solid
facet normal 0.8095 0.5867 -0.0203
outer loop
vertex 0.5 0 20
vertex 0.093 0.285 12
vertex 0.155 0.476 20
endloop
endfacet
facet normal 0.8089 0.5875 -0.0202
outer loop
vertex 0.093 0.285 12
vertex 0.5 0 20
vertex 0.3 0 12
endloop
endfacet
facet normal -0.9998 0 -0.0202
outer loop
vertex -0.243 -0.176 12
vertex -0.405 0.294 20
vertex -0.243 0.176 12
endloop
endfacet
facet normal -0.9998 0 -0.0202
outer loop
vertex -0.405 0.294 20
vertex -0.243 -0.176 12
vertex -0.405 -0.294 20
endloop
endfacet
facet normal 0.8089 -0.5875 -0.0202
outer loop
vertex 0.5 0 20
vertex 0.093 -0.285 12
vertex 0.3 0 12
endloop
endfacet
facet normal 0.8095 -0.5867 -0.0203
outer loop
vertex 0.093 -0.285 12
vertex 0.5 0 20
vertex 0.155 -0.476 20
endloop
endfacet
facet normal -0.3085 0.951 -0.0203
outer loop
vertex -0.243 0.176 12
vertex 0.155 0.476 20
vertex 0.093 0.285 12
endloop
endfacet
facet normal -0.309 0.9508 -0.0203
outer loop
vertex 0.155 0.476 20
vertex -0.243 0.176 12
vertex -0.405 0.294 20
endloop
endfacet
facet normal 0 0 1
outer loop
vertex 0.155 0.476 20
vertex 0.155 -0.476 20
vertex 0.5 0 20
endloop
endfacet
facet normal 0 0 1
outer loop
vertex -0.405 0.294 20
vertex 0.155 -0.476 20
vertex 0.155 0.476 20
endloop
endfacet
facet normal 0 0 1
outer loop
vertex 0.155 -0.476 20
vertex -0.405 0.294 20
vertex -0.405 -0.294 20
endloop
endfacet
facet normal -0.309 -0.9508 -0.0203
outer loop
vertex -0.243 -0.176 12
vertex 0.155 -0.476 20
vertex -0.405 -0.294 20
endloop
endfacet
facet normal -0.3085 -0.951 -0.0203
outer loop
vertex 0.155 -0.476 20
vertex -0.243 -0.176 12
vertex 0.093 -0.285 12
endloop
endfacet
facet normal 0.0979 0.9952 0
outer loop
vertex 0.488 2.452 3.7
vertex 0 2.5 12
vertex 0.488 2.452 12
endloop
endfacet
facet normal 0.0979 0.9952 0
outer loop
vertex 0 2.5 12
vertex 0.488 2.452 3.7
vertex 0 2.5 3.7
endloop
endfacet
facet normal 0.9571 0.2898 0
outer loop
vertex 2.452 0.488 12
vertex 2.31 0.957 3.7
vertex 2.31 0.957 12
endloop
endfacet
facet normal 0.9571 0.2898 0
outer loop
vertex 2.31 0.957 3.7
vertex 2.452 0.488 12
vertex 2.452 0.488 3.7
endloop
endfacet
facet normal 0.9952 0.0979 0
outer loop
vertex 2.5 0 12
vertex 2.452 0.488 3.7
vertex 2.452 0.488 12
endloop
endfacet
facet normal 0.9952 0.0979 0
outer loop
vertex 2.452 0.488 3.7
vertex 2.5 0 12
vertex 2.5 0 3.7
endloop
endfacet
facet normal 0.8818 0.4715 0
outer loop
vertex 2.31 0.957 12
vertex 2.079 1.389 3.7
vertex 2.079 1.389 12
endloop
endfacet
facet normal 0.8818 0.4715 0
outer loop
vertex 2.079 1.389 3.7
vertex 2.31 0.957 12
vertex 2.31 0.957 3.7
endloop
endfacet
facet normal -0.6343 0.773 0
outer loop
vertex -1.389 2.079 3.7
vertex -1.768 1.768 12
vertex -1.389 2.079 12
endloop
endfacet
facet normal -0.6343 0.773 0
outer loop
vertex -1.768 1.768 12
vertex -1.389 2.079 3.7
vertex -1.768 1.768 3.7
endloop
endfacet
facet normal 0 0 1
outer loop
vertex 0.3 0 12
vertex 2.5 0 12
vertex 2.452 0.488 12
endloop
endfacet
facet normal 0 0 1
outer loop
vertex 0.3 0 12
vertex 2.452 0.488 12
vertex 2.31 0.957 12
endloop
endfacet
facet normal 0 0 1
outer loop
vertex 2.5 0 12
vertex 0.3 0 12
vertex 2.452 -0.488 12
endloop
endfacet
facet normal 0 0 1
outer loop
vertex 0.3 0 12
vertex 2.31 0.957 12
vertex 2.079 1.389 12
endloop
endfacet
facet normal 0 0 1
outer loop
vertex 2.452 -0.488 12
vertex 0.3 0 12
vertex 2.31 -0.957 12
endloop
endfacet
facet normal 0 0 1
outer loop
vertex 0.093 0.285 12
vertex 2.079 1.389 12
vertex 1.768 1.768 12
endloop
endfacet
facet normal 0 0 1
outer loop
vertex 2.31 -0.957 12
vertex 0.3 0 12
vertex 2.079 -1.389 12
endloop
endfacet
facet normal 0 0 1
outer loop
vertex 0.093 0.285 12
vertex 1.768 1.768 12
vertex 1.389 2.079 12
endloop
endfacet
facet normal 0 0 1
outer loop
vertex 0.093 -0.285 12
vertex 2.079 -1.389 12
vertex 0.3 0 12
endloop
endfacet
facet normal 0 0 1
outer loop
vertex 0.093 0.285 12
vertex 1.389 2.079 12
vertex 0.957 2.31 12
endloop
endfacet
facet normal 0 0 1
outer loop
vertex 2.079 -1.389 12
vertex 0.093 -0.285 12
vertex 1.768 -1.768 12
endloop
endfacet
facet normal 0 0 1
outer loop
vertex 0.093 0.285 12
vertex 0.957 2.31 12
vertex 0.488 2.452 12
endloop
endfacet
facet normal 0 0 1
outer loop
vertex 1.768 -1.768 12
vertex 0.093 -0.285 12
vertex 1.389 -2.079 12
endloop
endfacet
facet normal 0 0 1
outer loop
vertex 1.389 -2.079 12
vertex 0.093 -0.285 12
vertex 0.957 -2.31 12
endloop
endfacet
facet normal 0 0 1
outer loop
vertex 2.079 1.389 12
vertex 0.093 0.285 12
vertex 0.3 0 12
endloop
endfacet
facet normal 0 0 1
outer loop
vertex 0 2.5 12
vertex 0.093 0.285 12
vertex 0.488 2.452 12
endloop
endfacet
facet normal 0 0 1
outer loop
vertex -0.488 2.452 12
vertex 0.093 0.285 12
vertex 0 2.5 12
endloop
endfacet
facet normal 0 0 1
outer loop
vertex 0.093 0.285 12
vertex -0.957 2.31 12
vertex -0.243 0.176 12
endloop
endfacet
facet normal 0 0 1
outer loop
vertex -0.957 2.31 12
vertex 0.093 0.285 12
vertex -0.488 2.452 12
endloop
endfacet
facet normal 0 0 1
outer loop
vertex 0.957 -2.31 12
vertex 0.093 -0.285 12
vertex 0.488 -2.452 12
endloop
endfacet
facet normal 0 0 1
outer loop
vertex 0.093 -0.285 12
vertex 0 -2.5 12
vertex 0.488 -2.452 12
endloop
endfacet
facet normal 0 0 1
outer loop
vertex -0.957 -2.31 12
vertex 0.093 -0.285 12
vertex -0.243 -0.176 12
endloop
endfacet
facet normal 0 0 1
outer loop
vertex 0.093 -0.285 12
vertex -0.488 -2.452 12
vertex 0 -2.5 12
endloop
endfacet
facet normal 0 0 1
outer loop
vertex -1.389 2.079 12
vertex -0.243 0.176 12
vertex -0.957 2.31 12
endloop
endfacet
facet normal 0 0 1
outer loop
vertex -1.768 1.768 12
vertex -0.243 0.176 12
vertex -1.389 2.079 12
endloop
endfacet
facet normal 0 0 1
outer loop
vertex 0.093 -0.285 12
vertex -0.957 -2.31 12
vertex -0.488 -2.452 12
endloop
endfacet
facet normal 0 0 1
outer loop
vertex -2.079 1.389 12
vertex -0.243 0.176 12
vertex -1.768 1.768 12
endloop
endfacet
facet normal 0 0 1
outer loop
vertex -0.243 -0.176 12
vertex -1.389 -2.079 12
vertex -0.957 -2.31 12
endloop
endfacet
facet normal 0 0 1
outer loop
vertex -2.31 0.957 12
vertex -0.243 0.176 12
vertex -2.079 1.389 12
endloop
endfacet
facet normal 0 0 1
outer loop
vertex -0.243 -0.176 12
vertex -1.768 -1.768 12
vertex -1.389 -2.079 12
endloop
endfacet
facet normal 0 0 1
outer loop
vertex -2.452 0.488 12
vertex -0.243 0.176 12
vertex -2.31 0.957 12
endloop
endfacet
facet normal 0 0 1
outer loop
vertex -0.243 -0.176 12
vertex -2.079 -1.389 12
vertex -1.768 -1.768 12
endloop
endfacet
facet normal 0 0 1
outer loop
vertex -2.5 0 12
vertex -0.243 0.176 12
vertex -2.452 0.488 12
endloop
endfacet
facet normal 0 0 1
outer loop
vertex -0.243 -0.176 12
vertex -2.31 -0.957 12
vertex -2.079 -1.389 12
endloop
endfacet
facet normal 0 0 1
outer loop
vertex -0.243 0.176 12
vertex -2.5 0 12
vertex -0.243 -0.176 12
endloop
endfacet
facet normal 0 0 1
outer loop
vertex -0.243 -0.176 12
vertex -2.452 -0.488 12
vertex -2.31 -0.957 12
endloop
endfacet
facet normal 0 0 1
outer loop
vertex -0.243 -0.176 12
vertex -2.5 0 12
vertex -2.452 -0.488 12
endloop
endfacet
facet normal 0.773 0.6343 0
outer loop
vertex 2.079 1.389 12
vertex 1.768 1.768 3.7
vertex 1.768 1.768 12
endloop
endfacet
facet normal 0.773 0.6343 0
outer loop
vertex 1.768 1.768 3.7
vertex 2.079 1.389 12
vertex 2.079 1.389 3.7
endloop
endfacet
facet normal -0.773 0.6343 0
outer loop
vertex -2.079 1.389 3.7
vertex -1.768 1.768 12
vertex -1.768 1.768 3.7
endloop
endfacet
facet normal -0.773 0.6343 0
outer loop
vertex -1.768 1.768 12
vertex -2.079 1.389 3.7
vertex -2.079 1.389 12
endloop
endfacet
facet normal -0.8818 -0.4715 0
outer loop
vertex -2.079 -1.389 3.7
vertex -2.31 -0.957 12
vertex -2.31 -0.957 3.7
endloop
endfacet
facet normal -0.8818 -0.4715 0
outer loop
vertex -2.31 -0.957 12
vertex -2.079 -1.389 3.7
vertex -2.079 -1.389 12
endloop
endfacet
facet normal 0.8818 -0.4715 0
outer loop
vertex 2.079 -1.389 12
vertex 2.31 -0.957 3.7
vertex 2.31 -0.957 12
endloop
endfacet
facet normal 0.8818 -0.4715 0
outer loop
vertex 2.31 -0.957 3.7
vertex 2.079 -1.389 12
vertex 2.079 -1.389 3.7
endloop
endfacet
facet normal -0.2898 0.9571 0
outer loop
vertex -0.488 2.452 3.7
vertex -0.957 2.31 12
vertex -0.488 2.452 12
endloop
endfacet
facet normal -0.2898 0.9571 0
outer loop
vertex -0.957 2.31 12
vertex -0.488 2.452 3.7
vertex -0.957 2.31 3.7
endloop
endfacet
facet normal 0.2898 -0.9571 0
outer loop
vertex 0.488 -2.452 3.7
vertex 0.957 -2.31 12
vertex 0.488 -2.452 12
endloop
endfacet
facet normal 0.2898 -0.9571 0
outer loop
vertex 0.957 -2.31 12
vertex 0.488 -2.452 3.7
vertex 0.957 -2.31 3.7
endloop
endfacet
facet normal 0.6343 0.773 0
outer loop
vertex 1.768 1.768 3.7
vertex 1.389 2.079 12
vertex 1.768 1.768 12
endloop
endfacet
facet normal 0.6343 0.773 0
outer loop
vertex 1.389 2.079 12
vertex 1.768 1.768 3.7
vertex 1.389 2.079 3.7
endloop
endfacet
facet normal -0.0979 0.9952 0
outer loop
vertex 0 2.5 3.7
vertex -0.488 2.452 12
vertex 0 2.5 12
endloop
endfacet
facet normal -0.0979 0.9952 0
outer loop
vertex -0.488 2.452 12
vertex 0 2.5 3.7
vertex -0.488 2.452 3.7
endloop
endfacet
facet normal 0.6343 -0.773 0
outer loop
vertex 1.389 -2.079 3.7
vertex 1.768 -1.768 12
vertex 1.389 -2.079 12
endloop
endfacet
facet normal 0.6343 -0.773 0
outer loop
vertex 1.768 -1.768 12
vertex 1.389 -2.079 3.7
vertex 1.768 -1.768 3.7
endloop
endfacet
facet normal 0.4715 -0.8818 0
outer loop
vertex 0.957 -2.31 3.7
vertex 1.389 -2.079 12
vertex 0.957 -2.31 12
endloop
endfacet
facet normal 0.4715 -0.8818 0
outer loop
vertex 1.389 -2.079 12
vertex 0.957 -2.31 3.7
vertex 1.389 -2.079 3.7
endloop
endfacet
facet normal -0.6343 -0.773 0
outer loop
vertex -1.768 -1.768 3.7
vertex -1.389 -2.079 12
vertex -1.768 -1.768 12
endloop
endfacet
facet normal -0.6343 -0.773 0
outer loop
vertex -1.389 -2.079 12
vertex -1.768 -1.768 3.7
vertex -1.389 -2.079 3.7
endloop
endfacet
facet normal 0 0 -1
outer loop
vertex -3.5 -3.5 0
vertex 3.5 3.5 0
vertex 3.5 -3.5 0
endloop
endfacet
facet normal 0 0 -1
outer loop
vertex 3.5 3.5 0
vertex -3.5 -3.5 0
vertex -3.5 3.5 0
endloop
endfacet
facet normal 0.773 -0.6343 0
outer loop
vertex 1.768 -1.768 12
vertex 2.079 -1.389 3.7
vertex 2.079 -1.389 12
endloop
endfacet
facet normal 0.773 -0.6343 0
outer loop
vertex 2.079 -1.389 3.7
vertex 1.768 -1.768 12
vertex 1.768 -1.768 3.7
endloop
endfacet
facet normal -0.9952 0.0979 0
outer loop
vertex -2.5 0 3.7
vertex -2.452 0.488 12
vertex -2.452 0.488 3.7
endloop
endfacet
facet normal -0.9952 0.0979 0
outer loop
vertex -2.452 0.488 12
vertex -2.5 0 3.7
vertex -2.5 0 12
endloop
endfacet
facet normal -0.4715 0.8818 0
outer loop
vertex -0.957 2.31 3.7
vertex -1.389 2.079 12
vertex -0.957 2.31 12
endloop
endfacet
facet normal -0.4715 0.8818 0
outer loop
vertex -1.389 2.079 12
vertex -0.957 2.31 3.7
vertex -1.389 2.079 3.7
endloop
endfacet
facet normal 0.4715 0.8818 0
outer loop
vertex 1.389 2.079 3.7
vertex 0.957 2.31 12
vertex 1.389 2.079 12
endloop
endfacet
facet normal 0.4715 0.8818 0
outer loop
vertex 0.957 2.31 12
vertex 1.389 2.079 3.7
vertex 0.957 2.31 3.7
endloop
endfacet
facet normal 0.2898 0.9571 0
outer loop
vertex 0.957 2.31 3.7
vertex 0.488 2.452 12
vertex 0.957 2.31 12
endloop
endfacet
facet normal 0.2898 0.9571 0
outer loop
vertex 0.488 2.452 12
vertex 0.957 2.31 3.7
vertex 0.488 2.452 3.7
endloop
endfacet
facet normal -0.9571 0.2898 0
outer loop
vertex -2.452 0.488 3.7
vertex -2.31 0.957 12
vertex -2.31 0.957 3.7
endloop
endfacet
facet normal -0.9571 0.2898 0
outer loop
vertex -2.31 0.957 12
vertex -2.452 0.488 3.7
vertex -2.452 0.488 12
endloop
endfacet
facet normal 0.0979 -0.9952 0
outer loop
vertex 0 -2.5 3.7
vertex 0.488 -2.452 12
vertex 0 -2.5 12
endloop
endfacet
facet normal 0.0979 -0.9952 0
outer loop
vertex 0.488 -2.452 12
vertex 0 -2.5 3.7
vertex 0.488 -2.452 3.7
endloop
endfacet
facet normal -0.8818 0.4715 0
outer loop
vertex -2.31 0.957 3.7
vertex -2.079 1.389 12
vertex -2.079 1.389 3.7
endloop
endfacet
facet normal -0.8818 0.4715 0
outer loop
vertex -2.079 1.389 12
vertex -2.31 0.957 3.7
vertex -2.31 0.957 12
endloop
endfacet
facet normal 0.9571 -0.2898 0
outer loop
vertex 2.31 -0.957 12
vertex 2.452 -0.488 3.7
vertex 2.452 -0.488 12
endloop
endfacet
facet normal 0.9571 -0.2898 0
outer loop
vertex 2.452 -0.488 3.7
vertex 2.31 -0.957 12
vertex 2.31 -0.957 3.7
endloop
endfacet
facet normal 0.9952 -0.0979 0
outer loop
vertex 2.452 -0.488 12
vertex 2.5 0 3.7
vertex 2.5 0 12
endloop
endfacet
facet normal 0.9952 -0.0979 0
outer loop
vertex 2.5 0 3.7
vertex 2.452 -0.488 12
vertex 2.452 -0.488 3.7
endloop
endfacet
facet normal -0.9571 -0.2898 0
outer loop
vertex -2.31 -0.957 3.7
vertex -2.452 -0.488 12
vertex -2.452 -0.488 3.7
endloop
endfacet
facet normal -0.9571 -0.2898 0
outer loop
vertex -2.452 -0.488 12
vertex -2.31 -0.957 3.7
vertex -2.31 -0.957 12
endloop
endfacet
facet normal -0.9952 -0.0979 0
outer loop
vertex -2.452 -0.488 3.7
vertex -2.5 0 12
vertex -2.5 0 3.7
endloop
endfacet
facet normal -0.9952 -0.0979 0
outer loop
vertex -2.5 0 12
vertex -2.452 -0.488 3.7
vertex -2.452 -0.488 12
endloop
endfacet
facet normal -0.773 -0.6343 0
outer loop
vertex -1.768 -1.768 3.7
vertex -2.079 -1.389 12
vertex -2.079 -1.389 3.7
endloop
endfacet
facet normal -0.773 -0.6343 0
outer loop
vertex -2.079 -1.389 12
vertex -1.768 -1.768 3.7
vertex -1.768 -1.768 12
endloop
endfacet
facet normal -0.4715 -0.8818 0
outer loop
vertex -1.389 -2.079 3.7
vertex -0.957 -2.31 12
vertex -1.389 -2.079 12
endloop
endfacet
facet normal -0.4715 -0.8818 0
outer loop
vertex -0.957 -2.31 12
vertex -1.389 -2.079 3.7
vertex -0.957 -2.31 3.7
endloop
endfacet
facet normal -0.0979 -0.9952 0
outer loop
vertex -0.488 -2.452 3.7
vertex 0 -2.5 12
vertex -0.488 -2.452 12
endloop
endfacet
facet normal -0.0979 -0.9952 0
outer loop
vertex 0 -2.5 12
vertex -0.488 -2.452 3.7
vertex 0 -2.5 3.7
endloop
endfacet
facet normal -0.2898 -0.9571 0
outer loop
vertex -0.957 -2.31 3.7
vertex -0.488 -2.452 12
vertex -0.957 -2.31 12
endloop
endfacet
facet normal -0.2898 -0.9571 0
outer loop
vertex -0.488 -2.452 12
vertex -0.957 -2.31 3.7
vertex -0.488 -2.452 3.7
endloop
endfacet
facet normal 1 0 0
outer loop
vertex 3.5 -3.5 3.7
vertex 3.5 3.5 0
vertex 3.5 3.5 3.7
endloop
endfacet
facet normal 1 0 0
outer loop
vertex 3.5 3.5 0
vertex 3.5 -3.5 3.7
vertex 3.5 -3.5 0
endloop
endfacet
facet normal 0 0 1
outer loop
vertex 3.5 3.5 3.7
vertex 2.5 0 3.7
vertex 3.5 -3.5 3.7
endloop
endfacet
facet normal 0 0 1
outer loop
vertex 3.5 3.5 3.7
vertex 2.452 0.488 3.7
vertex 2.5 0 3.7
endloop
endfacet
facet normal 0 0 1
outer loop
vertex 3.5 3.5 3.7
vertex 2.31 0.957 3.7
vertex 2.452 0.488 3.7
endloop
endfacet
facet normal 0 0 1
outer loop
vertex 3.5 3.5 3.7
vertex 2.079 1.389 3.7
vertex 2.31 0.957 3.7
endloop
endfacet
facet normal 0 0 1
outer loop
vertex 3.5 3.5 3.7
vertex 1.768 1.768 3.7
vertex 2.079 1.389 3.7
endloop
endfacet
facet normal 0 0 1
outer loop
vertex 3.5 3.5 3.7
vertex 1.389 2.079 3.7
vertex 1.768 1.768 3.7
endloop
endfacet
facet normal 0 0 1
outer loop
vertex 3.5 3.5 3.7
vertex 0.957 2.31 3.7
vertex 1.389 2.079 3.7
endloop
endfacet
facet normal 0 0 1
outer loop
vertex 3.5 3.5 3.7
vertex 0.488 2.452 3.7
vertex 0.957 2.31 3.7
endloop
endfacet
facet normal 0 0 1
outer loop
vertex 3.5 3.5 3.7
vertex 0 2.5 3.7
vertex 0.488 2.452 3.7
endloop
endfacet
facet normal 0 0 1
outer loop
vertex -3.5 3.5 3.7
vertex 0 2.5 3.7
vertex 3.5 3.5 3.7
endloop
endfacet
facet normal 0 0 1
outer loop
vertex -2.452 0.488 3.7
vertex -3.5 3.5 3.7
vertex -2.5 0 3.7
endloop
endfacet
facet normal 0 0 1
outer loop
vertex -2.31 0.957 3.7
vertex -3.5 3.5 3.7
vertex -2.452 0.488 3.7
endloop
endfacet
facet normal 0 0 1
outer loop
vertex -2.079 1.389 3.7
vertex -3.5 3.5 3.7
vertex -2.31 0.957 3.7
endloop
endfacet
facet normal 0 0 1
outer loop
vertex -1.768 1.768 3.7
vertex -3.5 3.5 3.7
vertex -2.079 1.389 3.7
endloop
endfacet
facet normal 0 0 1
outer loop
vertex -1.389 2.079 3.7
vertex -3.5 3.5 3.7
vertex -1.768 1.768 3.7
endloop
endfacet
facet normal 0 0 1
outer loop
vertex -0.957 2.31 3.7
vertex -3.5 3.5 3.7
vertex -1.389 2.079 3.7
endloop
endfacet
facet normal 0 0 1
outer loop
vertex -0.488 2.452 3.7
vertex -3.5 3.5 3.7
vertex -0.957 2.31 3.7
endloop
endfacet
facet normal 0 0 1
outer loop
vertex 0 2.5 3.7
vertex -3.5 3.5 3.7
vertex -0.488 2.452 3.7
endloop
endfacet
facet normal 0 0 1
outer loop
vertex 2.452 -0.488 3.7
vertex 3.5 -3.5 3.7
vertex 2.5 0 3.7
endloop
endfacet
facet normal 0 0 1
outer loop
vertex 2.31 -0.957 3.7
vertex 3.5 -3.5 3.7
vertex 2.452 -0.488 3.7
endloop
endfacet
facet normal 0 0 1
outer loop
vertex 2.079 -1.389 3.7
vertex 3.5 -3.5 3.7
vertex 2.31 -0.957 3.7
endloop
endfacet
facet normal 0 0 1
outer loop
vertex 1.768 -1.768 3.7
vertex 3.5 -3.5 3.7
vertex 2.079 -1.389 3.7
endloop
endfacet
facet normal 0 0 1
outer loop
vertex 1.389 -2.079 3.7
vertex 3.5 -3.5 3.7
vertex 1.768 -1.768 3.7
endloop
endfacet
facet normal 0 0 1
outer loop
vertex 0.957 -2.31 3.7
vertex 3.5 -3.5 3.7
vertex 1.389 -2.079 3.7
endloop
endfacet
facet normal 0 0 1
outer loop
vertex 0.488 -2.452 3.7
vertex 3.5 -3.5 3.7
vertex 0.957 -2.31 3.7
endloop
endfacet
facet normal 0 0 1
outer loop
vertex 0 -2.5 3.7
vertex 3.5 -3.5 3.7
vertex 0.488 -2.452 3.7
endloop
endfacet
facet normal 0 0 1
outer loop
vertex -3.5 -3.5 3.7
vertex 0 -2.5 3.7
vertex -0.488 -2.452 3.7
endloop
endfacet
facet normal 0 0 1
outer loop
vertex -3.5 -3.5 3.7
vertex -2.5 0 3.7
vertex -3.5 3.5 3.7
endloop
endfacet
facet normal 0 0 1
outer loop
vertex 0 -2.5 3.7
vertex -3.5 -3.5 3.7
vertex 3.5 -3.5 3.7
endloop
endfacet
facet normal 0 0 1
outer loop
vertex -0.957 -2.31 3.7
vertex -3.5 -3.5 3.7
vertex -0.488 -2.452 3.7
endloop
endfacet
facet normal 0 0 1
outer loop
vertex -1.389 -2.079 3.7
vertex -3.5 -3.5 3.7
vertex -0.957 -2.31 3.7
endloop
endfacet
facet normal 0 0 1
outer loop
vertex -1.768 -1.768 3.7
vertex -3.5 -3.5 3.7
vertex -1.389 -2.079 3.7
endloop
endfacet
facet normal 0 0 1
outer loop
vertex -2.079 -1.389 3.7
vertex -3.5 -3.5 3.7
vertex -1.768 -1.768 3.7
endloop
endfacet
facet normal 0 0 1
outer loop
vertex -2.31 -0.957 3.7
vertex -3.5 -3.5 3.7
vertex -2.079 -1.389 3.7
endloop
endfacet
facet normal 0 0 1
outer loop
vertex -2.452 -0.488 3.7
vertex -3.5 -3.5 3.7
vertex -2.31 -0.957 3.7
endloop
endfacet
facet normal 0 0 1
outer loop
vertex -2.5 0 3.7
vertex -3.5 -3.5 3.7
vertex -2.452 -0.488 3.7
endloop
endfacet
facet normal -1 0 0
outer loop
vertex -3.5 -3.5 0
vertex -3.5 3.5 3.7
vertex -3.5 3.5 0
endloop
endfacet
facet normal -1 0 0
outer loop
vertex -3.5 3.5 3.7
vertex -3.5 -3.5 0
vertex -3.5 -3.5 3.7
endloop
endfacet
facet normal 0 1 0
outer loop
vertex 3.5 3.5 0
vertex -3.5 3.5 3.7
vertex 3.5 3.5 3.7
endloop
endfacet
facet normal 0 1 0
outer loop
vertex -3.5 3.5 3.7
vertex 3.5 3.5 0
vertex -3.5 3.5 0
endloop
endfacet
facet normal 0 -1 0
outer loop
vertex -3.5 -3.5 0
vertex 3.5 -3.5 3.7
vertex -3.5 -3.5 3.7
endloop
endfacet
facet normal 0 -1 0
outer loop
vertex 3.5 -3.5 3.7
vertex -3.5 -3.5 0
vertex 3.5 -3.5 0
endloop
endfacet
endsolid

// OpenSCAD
/**
 * Martin Egli
 * 2023-09-13
 */

module origin(col = "red", loc_res = 5, height = 20) {
    color(col)
    cylinder(d1 = 0, d2 = 1, h = 20, $fn = loc_res);
}

//TC20-11RWA
module ledsTC2011RWA(loc_res = 32, show_origin = 1) {
    // origin: center
    if(show_origin) {
        translate([0, 0, 0])
        origin();
    }
    
    translate([-6/2*2.54, -38.1/2, 0]) {
        // pins
        color("LightGray") {
            // pins 1 - 7
            translate([0, 0, -4])
            for(n = [0:1:6]) {
                translate([n*2.54, 0, 0])
                rotate([0, 0, 45])
                cylinder(d = 0.5, h = 4, $fn = 4);
            }
            // pins 8 - 14
            translate([0, 38.1, -4])
            for(n = [0:1:6]) {
                translate([n*2.54, 0, 0])
                rotate([0, 0, 45])
                cylinder(d = 0.5, h = 4, $fn = 4);
            }
        }
        deltax = (37.7-(6*2.54))/2;
        deltay = (53-38.1)/2;
        // case
        color("White")
        translate([-deltax, -deltay, 0])
        cube([37.7-0.1, 53, 8.45]);
        
        deltax2 = (37.7 - 4*7.62)/2;
        deltay2 = (53 - 6*7.62)/2;
        leddia = 5.0;
        color("Red")
        translate([-(deltax-deltax2), -deltay2, 8.45]) {
            for(m = [0:1:6]) {
                for(n = [0:1:4]) {
                    translate([n*7.62, m*7.62, 0])
                    cylinder(d = leddia, h = 0.1, $fn = loc_res);
                }
            }
        }
    }
}

//TC20-11RWA
module ledsTC2011RWA_cut(loc_res = 32, cut_height = 10, show_origin = 1) {
    // origin: center
    if(show_origin) {
        translate([0, 0, 0])
        origin();
    }
    
    translate([-6/2*2.54, -38.1/2, 0]) {
        deltax = (37.7-(6*2.54))/2+0.2;
        deltay = (53-38.1)/2+0.2;
        // case
        translate([-deltax, -deltay, 0])
        cube([37.7-0.1+0.2*2, 53+0.2*2, cut_height]);
    }
}

//TC20-11RWA
module ledsTC2011RWA_chtholes(loc_res = 32) {
    translate([-6/2*2.54, -38.1/2, 0]) {
        // pins
        color("LightGray") {
            // pins 1 - 7
            translate([0, 0, -4])
            for(n = [0:1:6]) {
                translate([n*2.54, 0, 0])
                rotate([0, 0, 45])
                cylinder(d = 1, h = 5, $fn = loc_res);
            }
            // pins 8 - 14
            translate([0, 38.1, -4])
            for(n = [0:1:6]) {
                translate([n*2.54, 0, 0])
                rotate([0, 0, 45])
                cylinder(d = 1, h = 5, $fn = loc_res);
            }
        }
    }
}
//ledsTC2011RWA();
//ledsTC2011RWA_cut();
//ledsTC2011RWA_chtholes();

//TS02-66-95-BK-260-LCR-D
module buttonTS0266(height = 6, loc_res = 32, show_origin = 1) {
    // origin: center
    if(show_origin) {
        translate([0, 0, 0])
        origin();
    }
    // button
    color("Black")
    translate([0, 0, 0])
    cylinder(d = 4, h = height, $fn = loc_res);
    
    // body
    color("Black")
    translate([-3, -3, 0])
    cube([6, 6, 3.5-0.1]);
    color("LightGray")
    translate([-3, -3, 3.5-0.1])
    cube([6, 6, 0.1]);
    
    // THT
    color("LightGray") {
        translate([-6.5/2, -4.5/2, -3])
        cylinder(d = 1.0, h = 4, $fn = loc_res);
        translate([-6.5/2, +4.5/2, -3])
        cylinder(d = 1.0, h = 4, $fn = loc_res);
        translate([+6.5/2, -4.5/2, -3])
        cylinder(d = 1.0, h = 4, $fn = loc_res);
        translate([+6.5/2, +4.5/2, -3])
        cylinder(d = 1.0, h = 4, $fn = loc_res);
    }
}

module buttonTS026695(loc_res = 32, show_origin = 1) {
    buttonTS0266(9.5, loc_res, show_origin);
}

module buttonTS0266_cut(height = 12, loc_res = 32, show_origin = 1) {
    // origin: center
    if(show_origin) {
        translate([0, 0, 0])
        origin();
    }
    // button
    translate([0, 0, 0])
    cylinder(d = 5, h = height, $fn = loc_res);
    // body
    translate([-3.5, -3.5, 0])
    cube([7, 7, 3.7]);
}

module buttonTS0266_cutholes(loc_res = 32) {
    // origin: center
    translate([-6.5/2, -4.5/2, -3])
    cylinder(d = 1.5, h = 5, $fn = loc_res);
    translate([-6.5/2, +4.5/2, -3])
    cylinder(d = 1.5, h = 5, $fn = loc_res);
    translate([+6.5/2, -4.5/2, -3])
    cylinder(d = 1.5, h = 5, $fn = loc_res);
    translate([+6.5/2, +4.5/2, -3])
    cylinder(d = 1.5, h = 5, $fn = loc_res);
}

//buttonTS026695();
buttonTS0266_cut();
//buttonTS0266_cutholes();

module switchMFP140_5x(loc_res = 32, show_origin = 1) {
    // origin: center
    if(show_origin) {
        translate([0, 0, 0])
        origin();
    }
    color("Silver")
    translate([-18.2/2, -6/2, -5.6/2])
    cube([18.2, 6, 5.6]);
    color("Black")
    translate([-2*3.2, 6/2, -3.4/2])
    cube([3.4, 5, 3.4]);
    // pins, 5x
    color("Silver")
    for(n = [0:1:4]) {
        translate([-2*3.2+n*3.2, -3.4-6/2, 0])
        rotate([-90, 0, 0])
        rotate([0, 0, 45])
        cylinder(d = 1, h = 4, $fn = 4);
    }
}

module switchMFP140_5x_cut() {
    translate([-18.6/2, -6.4/2, -6/2])
    cube([18.6, 6.4, 6]);
}
//switchMFP140_5x();
//switchMFP140_5x_cut();
